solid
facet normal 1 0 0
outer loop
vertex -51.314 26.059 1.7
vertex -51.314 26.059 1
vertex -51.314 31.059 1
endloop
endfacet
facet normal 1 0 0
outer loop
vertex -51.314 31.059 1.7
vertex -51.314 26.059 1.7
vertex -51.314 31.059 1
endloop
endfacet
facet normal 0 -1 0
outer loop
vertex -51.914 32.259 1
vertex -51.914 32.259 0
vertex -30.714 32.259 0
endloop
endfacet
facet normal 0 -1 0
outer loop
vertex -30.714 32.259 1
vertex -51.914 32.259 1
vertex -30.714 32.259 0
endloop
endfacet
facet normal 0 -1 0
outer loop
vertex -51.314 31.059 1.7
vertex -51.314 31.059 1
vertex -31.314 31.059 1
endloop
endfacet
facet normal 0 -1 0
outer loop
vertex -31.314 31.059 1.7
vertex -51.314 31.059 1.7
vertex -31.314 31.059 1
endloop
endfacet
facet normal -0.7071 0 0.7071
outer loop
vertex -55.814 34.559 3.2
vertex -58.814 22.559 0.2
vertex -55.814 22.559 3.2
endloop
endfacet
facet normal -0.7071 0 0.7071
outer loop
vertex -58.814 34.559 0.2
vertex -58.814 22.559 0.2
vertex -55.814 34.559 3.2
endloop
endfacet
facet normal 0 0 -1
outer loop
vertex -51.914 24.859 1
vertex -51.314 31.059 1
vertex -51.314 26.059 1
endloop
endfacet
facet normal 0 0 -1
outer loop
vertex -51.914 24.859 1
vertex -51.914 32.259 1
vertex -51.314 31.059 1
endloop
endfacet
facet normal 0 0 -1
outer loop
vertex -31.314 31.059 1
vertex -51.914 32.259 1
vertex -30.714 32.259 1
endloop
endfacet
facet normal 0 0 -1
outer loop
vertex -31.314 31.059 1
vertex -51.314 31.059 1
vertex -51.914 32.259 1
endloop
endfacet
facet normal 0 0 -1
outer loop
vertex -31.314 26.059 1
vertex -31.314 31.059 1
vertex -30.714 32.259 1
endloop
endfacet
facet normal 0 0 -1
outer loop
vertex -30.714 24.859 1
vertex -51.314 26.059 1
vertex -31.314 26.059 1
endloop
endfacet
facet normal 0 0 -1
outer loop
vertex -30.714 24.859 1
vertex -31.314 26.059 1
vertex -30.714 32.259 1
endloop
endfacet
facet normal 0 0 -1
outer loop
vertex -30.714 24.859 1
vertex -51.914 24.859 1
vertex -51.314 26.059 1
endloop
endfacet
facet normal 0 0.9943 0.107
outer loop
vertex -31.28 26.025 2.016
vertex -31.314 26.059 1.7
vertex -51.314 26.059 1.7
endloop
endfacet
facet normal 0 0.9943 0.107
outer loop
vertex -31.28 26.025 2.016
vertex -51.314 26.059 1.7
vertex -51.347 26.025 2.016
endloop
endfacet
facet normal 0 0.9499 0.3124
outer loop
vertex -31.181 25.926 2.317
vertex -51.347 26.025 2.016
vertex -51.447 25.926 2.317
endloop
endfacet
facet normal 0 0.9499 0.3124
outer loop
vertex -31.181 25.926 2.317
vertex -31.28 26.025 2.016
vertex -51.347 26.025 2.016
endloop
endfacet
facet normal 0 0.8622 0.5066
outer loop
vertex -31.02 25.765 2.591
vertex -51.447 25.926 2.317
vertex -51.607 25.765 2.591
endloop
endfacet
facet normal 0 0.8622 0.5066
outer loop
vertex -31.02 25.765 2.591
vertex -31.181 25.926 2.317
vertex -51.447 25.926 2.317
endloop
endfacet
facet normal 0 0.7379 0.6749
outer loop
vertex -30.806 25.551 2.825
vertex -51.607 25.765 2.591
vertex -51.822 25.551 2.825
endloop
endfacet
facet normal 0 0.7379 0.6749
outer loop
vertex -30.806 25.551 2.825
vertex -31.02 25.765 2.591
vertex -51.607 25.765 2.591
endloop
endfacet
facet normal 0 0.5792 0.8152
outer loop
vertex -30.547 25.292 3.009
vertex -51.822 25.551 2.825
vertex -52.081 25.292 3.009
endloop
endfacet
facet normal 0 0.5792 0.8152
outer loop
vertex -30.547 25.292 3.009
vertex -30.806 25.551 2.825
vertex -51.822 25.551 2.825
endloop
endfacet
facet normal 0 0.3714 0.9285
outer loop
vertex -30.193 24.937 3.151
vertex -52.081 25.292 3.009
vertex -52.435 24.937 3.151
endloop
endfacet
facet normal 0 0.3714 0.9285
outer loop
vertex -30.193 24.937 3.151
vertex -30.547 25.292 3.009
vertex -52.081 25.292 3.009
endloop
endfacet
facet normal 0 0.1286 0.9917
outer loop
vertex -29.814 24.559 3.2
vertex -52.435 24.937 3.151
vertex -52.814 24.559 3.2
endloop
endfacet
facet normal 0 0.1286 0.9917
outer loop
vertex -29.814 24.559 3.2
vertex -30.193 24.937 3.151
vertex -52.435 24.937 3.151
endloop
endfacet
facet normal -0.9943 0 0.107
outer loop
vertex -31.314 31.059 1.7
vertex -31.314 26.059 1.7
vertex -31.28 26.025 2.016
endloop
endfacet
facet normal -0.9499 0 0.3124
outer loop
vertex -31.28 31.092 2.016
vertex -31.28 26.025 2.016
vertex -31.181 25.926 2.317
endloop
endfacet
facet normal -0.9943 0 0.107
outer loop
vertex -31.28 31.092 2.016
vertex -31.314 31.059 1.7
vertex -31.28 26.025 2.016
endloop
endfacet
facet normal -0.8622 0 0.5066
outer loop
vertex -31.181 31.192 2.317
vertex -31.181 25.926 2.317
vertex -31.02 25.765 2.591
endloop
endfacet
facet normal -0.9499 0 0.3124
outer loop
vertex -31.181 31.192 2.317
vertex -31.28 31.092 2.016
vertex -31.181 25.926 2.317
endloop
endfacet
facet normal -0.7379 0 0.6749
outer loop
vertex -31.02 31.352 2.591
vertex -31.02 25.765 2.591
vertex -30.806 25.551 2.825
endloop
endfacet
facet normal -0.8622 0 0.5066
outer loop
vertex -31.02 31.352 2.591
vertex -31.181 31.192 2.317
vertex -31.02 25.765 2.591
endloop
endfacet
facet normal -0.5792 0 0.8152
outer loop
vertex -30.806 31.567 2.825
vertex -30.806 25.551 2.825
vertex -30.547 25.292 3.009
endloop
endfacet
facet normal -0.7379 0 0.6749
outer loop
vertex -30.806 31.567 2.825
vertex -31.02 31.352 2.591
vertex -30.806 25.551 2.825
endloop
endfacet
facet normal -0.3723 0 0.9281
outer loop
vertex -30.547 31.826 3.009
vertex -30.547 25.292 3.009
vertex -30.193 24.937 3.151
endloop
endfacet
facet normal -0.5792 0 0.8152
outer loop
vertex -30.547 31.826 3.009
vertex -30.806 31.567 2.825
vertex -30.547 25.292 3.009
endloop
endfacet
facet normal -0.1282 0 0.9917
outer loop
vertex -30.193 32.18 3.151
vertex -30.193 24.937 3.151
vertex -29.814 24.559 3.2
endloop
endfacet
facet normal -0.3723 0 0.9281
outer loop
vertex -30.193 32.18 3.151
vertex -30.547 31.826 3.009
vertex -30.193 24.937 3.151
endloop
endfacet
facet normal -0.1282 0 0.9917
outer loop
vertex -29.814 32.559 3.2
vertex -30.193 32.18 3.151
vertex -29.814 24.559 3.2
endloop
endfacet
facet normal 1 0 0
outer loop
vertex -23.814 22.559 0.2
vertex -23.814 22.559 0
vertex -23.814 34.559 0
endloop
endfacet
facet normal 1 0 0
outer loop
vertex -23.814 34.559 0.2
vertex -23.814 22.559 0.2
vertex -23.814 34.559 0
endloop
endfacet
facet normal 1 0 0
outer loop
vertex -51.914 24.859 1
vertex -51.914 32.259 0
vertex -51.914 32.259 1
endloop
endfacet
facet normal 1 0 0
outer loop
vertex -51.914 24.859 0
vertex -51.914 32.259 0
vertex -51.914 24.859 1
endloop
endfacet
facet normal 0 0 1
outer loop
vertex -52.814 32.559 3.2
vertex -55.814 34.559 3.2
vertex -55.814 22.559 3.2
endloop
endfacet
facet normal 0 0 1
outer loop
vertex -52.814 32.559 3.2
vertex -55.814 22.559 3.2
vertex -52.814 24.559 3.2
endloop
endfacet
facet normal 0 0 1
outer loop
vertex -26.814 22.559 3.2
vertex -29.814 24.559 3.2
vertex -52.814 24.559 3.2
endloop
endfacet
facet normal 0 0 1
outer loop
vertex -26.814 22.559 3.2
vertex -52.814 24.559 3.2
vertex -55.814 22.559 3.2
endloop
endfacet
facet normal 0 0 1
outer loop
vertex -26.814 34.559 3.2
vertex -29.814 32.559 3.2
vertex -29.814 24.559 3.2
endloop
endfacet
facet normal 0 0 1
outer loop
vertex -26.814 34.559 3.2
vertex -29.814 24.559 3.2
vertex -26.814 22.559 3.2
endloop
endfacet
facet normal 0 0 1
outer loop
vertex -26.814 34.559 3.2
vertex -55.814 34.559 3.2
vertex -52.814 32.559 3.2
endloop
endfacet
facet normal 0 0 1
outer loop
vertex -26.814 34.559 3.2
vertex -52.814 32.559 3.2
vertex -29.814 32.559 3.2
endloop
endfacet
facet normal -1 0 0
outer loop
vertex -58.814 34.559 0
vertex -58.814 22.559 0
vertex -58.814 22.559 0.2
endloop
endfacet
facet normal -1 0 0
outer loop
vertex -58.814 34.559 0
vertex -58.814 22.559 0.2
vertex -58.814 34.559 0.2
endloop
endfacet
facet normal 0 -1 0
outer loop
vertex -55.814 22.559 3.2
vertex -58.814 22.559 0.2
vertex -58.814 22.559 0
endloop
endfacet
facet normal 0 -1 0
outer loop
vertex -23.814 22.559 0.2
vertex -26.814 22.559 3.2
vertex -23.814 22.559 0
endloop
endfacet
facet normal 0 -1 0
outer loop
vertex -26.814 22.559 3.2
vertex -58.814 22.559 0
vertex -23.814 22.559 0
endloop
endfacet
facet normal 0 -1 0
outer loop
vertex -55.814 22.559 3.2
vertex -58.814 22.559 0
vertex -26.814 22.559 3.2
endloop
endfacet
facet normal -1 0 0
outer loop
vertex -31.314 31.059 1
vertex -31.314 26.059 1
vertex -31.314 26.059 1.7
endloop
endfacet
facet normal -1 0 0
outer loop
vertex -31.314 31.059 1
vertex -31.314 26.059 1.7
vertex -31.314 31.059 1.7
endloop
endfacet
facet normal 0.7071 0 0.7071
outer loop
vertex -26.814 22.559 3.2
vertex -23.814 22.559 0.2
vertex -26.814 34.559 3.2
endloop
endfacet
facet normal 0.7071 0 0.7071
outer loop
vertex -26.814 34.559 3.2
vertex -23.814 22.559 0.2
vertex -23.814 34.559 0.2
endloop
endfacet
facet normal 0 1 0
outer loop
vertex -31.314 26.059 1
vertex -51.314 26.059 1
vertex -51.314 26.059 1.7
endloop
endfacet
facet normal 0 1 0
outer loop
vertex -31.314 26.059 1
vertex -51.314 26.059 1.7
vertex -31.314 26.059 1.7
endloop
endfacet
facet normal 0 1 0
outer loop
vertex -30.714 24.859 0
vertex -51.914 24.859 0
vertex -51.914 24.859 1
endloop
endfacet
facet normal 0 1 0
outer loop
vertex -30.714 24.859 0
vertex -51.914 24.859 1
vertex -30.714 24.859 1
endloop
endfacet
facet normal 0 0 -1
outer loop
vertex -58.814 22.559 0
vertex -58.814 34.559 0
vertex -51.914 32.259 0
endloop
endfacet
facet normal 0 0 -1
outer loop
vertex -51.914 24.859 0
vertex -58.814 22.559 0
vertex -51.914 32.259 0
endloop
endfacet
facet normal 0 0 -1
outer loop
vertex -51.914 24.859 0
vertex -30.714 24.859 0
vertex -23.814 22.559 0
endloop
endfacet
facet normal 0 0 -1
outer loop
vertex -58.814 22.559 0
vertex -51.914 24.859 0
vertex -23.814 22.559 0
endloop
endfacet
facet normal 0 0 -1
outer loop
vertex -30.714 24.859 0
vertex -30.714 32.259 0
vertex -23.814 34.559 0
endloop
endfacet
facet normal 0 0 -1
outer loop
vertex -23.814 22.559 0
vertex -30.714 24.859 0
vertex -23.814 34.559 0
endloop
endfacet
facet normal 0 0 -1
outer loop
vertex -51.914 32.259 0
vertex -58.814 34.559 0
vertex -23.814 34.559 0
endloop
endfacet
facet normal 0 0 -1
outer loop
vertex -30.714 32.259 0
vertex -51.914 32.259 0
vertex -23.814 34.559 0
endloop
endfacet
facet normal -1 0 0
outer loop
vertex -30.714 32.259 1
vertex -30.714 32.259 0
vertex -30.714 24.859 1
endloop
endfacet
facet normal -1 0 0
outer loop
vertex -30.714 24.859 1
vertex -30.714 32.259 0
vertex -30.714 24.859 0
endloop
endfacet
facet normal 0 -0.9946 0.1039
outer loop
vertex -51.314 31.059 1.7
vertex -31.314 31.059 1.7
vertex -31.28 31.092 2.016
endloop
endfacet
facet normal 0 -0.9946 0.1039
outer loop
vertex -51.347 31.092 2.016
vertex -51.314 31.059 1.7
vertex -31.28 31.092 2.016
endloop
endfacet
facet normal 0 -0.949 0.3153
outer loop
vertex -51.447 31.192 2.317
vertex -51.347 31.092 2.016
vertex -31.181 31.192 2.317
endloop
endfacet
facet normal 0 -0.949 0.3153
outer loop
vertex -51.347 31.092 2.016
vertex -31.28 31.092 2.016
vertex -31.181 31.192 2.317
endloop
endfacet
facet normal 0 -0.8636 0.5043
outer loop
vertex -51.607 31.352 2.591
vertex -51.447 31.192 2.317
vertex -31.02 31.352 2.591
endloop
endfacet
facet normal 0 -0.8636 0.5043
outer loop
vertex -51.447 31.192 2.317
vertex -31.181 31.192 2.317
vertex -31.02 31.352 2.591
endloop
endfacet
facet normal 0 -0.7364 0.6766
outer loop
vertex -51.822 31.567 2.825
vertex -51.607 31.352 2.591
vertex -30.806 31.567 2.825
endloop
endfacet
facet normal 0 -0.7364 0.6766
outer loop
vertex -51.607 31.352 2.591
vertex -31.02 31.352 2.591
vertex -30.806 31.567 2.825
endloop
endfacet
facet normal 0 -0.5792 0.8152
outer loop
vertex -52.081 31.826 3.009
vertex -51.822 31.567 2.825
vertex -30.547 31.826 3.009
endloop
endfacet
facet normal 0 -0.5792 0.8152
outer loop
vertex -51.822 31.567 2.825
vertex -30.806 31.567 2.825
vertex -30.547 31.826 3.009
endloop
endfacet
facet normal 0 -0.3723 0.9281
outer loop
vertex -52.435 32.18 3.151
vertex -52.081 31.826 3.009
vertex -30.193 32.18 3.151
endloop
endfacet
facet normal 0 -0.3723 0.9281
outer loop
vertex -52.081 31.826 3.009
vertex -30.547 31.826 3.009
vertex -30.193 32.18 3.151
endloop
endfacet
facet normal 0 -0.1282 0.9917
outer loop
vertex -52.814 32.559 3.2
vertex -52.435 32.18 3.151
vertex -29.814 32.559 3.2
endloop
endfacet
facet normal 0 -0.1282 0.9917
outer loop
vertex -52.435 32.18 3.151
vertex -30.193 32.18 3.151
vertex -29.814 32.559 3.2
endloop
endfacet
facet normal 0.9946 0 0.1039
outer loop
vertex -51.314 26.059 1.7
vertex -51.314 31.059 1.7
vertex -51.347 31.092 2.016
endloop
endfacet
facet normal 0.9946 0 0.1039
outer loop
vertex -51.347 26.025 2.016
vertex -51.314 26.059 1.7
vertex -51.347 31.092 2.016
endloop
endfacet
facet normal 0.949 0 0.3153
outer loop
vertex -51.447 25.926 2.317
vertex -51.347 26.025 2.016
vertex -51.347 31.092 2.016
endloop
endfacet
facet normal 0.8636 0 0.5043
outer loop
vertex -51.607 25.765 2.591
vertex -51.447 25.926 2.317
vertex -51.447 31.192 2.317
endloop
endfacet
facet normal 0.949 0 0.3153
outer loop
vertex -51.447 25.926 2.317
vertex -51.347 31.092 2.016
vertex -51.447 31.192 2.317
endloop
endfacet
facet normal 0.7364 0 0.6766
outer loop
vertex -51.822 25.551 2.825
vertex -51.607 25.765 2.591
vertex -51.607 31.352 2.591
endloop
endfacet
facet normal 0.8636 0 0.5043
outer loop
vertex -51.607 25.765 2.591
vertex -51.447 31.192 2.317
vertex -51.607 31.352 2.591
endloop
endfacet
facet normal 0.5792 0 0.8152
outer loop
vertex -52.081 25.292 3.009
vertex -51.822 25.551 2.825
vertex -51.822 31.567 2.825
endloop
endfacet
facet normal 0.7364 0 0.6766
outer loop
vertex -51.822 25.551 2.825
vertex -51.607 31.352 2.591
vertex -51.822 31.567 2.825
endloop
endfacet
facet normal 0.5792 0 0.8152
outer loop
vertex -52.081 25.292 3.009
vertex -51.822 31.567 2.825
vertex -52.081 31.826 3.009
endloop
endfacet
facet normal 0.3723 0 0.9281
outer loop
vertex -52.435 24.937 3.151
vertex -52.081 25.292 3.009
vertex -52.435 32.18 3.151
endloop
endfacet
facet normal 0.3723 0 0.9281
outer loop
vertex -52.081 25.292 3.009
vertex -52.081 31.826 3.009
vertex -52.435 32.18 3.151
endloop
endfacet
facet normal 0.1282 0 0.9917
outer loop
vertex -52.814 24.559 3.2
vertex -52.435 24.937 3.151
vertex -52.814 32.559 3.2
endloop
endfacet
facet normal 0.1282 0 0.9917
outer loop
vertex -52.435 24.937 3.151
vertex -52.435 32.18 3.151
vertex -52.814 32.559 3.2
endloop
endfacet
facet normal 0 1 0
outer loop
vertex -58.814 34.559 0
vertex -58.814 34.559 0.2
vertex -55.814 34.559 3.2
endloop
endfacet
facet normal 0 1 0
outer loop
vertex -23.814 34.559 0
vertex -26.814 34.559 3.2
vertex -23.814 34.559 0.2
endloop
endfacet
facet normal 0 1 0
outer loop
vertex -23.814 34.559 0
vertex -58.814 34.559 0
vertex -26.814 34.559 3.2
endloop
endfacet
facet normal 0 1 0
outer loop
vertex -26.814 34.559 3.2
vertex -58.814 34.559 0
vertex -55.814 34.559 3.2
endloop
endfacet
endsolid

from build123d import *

# Parameters (mm, degrees)
F0_W     = 35
F0_H     = 12
F0_W_2   = 20
F0_H_2   = 5
F1_DEPTH = 3.2
F2_R     = 1.5
F3_W     = 21.2
F3_H     = 7.4
F4_DEPTH = 1
F5_SIZE2 = 3
F5_SIZE  = 3


with BuildPart() as f1:
    # F0 (on Top) → F1 (new body)
    with BuildSketch(Plane.XY):
        with Locations((-41.313777, 28.558676)):
            Rectangle(F0_W, F0_H)
        with Locations((-41.313777, 28.558676)):
            Rectangle(F0_W_2, F0_H_2, mode=Mode.SUBTRACT)
    extrude(amount=F1_DEPTH)

    # F2
    f2_edges = [f1.edges().sort_by_distance(p)[0] for p in [
        (-41.313777, 31.058676, 3.2),
        (-31.313777, 28.558676, 3.2),
        (-51.313777, 28.558676, 3.2),
        (-41.313777, 26.058676, 3.2),
    ]]
    fillet(f2_edges, radius=F2_R)

    # F3 (on face) → F4 (cut)
    with BuildSketch(Plane(origin=(0, 0, 0), x_dir=(1, 0, 0), z_dir=(0, 0, -1))):
        with Locations((-41.313777, -28.558676)):
            Rectangle(F3_W, F3_H)
    extrude(amount=-F4_DEPTH, mode=Mode.SUBTRACT)

    # F5
    f5_edges = [f1.edges().sort_by_distance(p)[0] for p in [
        (-58.813777, 28.558676, 3.2),
        (-23.813777, 28.558676, 3.2),
    ]]
    chamfer(f5_edges, length=F5_SIZE, length2=F5_SIZE2)


solid = f1.part
